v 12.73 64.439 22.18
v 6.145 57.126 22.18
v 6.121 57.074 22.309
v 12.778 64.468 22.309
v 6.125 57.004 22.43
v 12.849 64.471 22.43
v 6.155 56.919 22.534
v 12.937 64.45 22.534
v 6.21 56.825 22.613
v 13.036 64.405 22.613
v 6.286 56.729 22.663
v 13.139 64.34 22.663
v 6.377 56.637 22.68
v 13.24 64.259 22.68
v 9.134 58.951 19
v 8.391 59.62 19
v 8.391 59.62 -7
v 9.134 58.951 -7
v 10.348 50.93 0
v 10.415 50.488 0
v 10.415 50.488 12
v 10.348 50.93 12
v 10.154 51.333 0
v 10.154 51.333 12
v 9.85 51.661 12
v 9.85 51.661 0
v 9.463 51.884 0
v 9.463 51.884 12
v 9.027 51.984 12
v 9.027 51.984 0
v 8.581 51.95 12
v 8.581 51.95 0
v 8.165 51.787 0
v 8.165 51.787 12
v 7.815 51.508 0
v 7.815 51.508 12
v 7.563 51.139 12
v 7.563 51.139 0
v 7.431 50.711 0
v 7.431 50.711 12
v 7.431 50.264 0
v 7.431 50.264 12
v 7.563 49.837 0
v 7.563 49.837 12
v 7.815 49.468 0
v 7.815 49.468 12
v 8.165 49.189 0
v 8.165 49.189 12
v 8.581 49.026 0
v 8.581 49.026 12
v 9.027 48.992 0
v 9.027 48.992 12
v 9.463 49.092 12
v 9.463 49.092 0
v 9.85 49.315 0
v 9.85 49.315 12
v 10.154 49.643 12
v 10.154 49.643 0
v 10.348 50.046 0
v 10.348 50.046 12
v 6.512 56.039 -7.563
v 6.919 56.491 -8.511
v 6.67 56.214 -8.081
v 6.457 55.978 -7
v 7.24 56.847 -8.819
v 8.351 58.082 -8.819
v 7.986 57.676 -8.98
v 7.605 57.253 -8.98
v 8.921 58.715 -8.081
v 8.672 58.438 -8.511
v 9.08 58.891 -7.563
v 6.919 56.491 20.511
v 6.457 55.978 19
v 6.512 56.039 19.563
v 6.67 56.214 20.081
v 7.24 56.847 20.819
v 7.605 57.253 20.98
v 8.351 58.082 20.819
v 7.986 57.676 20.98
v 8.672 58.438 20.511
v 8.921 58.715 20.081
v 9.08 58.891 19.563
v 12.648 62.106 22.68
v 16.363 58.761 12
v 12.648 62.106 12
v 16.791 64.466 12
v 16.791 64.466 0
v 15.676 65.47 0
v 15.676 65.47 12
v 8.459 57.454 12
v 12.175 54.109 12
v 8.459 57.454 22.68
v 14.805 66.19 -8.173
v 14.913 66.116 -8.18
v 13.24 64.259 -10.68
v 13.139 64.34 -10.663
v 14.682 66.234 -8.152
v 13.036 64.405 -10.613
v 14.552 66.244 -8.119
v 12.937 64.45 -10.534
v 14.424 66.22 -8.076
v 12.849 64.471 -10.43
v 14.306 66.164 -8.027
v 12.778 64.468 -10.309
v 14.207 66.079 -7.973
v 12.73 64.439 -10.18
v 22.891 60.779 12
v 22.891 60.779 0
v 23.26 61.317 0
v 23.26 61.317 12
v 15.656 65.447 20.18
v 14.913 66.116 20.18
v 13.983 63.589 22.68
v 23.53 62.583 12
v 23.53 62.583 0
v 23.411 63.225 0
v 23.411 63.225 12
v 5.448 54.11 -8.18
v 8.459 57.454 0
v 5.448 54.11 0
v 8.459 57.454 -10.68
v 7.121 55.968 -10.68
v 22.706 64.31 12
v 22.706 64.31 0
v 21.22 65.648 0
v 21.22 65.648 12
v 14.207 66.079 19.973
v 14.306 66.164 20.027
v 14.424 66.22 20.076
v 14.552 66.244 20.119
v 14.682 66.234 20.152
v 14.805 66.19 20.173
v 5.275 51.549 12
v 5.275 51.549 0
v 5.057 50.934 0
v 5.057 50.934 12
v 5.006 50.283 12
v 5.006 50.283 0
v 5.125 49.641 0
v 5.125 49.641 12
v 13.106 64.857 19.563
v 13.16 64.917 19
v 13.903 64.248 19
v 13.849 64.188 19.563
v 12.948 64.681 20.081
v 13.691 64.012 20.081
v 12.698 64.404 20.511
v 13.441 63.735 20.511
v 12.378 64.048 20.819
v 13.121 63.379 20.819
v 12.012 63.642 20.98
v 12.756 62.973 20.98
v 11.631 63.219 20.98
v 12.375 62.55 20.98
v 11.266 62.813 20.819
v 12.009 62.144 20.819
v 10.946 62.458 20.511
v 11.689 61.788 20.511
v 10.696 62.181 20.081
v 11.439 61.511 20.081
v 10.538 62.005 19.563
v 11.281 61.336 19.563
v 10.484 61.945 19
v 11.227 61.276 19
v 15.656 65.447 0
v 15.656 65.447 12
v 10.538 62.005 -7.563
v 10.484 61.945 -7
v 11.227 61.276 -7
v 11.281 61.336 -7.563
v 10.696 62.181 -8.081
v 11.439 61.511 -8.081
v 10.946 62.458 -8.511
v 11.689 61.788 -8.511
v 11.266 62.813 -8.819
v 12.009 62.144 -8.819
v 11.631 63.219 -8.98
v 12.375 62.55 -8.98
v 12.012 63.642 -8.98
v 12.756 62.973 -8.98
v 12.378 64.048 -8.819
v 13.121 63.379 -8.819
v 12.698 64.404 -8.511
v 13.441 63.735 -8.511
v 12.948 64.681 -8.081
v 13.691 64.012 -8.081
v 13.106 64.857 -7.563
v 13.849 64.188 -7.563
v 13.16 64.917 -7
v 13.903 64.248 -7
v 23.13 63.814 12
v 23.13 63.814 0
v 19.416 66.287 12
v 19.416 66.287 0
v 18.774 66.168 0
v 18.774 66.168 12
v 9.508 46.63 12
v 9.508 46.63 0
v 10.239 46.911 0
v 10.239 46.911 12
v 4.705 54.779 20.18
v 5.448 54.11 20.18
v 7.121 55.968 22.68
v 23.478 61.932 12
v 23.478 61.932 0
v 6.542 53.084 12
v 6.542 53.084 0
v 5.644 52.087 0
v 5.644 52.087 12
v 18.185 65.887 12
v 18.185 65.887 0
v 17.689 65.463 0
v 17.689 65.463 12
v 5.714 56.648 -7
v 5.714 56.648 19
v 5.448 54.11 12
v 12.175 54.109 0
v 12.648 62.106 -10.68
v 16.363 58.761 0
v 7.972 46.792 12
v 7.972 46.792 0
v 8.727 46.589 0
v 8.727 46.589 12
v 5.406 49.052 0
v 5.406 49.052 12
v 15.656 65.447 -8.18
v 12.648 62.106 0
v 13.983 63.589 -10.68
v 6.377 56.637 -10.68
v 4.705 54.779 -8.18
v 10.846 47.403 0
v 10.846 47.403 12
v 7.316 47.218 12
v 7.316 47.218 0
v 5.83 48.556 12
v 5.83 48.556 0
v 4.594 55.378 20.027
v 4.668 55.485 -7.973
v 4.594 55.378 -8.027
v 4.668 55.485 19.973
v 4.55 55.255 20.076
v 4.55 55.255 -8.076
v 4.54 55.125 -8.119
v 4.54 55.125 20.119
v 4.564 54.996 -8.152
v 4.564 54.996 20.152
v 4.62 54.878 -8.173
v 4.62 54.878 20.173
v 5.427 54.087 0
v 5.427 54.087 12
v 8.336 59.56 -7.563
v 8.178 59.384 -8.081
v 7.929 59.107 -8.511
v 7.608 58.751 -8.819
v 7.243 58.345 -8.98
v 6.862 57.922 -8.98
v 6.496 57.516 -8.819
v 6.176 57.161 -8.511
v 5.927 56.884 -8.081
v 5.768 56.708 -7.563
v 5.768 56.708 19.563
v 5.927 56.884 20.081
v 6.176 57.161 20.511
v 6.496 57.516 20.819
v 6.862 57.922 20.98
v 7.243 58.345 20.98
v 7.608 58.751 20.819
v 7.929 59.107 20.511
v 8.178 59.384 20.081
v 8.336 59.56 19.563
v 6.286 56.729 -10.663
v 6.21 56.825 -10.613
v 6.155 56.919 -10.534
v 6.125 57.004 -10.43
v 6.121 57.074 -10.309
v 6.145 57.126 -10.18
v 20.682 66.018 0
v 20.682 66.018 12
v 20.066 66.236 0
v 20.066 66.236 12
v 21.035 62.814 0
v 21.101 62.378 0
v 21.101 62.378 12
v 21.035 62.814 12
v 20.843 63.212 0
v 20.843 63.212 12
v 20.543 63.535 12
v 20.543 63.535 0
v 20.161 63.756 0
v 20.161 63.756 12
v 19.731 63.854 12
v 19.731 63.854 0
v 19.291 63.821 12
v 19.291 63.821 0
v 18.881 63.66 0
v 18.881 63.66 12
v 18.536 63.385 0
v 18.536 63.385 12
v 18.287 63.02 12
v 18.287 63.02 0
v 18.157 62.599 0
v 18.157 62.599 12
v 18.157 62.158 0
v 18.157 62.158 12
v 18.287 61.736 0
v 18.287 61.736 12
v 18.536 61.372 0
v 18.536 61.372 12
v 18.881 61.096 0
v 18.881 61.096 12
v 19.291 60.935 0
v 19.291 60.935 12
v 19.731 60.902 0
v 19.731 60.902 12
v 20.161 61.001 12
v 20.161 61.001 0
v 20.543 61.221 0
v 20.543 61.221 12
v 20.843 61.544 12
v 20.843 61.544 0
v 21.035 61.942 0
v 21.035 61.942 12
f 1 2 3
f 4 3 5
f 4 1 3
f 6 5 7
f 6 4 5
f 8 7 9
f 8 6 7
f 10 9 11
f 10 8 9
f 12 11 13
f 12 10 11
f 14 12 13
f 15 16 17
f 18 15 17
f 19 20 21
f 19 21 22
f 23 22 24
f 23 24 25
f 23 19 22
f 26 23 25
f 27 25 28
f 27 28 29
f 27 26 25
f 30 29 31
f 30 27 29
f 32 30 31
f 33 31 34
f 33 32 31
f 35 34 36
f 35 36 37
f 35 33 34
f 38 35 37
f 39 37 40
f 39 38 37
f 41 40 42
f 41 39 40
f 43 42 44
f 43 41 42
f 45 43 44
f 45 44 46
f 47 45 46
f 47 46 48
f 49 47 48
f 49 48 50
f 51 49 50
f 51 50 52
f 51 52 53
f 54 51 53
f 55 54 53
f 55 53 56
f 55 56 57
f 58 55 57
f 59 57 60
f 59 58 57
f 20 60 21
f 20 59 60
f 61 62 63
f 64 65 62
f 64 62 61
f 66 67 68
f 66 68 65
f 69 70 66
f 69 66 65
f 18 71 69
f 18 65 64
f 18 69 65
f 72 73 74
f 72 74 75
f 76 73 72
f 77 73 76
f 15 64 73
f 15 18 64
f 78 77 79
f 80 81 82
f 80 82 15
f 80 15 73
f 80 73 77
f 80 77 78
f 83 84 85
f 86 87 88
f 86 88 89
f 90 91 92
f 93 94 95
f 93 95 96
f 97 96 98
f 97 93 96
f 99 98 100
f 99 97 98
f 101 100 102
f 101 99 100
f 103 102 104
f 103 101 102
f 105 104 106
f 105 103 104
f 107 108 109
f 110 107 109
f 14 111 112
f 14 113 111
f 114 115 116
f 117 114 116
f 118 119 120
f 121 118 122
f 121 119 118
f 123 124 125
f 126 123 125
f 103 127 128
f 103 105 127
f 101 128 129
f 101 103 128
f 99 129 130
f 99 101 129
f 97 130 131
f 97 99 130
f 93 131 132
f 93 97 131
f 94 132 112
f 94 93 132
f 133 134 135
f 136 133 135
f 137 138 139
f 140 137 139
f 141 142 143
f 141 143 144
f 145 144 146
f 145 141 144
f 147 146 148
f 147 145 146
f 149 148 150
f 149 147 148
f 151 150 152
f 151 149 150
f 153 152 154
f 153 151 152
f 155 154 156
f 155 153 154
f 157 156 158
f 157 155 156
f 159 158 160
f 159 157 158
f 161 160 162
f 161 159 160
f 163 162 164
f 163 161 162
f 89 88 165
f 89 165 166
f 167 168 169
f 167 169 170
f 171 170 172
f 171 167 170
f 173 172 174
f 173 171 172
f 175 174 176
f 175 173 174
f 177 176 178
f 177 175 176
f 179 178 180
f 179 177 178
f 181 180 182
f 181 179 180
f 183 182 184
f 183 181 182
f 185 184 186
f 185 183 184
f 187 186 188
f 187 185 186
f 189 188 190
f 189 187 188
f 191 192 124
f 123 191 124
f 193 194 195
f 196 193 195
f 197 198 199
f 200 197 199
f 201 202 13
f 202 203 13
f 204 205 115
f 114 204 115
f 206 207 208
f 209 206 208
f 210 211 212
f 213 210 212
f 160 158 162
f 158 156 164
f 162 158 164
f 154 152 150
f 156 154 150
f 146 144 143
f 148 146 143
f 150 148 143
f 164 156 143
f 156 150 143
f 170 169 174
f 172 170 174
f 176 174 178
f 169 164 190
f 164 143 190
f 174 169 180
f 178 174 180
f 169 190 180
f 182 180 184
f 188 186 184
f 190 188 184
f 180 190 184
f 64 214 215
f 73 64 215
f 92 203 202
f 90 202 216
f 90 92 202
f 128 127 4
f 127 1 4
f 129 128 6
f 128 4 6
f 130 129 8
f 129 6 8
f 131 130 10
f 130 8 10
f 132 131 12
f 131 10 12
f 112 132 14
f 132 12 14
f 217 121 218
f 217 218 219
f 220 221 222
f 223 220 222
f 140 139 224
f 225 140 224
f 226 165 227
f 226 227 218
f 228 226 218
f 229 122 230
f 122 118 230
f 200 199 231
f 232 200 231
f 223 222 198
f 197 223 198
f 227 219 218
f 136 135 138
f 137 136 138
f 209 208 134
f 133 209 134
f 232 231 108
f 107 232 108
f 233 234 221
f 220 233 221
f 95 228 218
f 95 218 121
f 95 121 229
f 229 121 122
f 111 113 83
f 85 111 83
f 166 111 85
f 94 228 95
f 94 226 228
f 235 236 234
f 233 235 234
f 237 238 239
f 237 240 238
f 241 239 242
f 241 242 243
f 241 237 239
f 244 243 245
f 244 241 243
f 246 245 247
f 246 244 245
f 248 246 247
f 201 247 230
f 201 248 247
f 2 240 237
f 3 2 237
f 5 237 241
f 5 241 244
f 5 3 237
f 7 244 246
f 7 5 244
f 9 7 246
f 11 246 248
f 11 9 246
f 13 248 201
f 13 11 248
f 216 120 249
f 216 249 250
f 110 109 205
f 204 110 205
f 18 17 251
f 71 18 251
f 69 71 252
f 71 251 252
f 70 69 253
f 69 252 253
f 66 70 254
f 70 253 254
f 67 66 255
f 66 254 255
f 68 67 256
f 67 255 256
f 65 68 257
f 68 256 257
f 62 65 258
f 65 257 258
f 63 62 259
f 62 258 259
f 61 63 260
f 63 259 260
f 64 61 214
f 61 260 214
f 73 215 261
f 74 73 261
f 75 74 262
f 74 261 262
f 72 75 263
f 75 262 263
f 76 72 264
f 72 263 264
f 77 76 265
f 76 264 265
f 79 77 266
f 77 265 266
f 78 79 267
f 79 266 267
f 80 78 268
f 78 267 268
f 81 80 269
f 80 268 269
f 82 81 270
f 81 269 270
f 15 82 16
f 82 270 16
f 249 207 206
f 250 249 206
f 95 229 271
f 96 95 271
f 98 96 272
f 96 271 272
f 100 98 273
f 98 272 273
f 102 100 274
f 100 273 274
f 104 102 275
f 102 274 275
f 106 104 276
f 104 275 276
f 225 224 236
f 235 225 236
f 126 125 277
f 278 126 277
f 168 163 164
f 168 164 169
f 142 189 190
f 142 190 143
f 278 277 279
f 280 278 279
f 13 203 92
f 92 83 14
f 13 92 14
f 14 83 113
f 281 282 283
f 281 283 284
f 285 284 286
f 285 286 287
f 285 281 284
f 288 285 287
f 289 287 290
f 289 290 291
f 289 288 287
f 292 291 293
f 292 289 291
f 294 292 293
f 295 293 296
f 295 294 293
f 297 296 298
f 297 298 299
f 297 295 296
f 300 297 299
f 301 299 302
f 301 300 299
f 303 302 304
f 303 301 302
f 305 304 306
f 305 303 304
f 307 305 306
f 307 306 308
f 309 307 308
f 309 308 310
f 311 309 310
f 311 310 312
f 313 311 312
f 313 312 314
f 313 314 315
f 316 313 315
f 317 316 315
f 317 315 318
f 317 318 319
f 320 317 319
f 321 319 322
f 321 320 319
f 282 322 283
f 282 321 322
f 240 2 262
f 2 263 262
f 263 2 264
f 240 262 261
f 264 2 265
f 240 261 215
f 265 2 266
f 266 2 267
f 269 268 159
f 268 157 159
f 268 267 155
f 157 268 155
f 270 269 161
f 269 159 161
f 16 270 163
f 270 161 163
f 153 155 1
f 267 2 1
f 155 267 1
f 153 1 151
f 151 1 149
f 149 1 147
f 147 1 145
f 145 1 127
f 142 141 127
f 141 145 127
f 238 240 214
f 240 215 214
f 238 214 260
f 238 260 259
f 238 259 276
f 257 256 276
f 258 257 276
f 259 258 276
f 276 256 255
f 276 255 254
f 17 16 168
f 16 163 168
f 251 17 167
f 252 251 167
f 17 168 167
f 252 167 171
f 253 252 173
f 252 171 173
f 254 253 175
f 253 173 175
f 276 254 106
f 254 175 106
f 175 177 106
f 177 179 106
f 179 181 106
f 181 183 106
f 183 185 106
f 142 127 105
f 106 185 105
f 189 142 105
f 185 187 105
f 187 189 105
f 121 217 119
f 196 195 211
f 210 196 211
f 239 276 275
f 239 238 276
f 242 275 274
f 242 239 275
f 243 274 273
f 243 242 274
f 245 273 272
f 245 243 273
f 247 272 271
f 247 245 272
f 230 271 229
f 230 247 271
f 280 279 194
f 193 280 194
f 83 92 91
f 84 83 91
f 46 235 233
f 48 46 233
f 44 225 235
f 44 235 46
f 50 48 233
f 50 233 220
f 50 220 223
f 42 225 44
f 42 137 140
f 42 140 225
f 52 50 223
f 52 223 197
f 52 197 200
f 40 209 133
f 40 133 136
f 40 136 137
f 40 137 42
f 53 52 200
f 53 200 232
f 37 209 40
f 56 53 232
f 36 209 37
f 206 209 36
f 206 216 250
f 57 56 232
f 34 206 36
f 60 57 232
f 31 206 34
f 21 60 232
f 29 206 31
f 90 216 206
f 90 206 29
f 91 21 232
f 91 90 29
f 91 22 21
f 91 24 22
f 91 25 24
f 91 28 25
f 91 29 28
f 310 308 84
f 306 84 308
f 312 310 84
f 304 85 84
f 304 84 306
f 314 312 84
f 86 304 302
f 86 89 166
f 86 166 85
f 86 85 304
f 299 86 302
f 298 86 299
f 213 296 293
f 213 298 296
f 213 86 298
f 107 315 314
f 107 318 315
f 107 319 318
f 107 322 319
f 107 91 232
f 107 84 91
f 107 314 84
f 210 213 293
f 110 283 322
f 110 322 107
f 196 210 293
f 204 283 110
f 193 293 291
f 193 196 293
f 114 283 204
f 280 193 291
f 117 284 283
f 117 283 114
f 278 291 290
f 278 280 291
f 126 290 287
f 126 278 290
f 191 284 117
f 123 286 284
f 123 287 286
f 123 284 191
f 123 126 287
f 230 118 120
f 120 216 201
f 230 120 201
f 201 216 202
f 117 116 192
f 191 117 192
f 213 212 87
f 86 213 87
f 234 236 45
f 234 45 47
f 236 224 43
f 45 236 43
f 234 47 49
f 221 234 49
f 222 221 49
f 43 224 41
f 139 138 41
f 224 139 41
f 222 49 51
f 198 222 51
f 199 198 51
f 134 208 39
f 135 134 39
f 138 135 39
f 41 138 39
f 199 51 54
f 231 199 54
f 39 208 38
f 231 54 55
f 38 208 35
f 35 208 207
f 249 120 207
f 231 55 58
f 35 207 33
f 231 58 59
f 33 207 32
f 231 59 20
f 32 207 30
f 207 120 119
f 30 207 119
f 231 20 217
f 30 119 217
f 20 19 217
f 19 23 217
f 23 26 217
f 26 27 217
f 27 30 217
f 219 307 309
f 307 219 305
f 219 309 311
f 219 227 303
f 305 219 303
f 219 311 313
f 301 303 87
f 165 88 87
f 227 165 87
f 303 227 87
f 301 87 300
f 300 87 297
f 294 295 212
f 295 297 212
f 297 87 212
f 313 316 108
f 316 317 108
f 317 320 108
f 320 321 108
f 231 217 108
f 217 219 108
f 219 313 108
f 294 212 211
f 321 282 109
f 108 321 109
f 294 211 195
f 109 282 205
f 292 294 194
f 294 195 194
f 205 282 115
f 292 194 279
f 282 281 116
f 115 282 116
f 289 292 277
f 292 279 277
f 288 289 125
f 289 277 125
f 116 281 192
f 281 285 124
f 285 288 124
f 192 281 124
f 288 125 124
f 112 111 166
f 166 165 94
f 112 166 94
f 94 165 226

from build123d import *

# Parameters (mm, degrees)
MODEL_R             = 1.48
MODEL_R_2           = 1.5
BOSS_EXTRUDE1_DEPTH = 12
SKETCH3_W           = 12
SKETCH3_H           = 15.317128206
BOSS_EXTRUDE2_DEPTH = 1.5
BOSS_EXTRUDE3_DEPTH = 1.5
BOSS_EXTRUDE4_START = -4.5
BOSS_EXTRUDE4_DEPTH = 6.26
CHAMFER1_SIZE       = 2.5
FILLET2_R           = 0.5
CUT_EXTRUDE1_DEPTH  = 1


with BuildPart() as part:
    # Model → Boss-Extrude1 (new body)
    with BuildSketch(Plane.XY):
        Polygon((5.6444, 52.0867), (5.2748, 51.5489), (5.0569, 50.9337), (5.0057, 50.2831), (5.1246, 49.6414), (5.4056, 49.0523), (5.8295, 48.556), (7.3157, 47.2178), (7.9717, 46.7918), (8.7273, 46.5893), (9.5084, 46.6303), (10.2386, 46.9106), (10.8464, 47.4028), (22.8908, 60.7794), (23.2604, 61.3173), (23.4783, 61.9325), (23.5295, 62.5831), (23.4106, 63.2248), (23.1296, 63.8138), (22.7058, 64.3101), (21.2195, 65.6484), (20.6816, 66.018), (20.0664, 66.2359), (19.4158, 66.2871), (18.7741, 66.1681), (18.185, 65.8872), (17.6888, 65.4633), align=None)
        with Locations((19.6206, 62.3782)):
            Circle(MODEL_R, mode=Mode.SUBTRACT)
        with Locations((8.9146, 50.4879)):
            Circle(MODEL_R_2, mode=Mode.SUBTRACT)
    extrude(amount=BOSS_EXTRUDE1_DEPTH)

    # Sketch3 → Boss-Extrude2 (add)
    with BuildSketch(Plane(origin=(-22.783506803, 20.514455792, 0), x_dir=(0, 0, 1), z_dir=(-0.7431432988578212, 0.669132301837772, 0))):
        with Locations((6, 51.484746303)):
            Rectangle(SKETCH3_W, SKETCH3_H)
    extrude(amount=BOSS_EXTRUDE2_DEPTH)

    # Sketch4 → Boss-Extrude3 (add)
    with BuildSketch(Plane(origin=(-23.898221752, 21.518154244, 0), x_dir=(0, 0, 1), z_dir=(-0.7431432988578212, 0.669132301837772, 0))):
        Polygon((-10.680029898, 56.112643872), (-10.680029898, 59.112643872), (-7.680029898, 59.112643872), (19.680029898, 59.112643872), (22.680029898, 59.112643872), (22.680029898, 56.112643872), (22.680029898, 46.856848734), (22.680029898, 43.856848734), (19.680029898, 43.856848734), (-7.680029898, 43.856848734), (-10.680029898, 43.856848734), (-10.680029898, 46.856848734), align=None)
    extrude(amount=BOSS_EXTRUDE3_DEPTH)

    # Sketch9 → Boss-Extrude4 (add)
    with BuildSketch(Plane(origin=(29.346034145, 32.591923246, 0), x_dir=(0.7431432988578212, -0.669132301837772, 0), z_dir=(-0.669132301837772, -0.7431432988578212, 0)).offset(BOSS_EXTRUDE4_START)):
        Polygon((-32.15829543, 12), (-32.15829543, 22.680029898), (-27.158287979, 12), align=None)
    boss_extrude4 = extrude(amount=-BOSS_EXTRUDE4_DEPTH)

    # Mirror1: Boss-Extrude4 across plane
    add(boss_extrude4.mirror(Plane.XY.offset(6)))

    # Chamfer1
    chamfer1_edges = [part.edges().sort_by_distance(p)[0] for p in [
        (4.890454919, 54.611926717, 22.680029898),
        (4.890454919, 54.611926717, -10.680029898),
        (15.098600236, 65.949168642, -10.680029898),
        (15.098600236, 65.949168642, 22.680029898),
    ]]
    chamfer(chamfer1_edges, length=CHAMFER1_SIZE)

    # Fillet2
    fillet2_edges = [part.edges().sort_by_distance(p)[0] for p in [
        (4.333097445, 55.113775943, 6),
        (13.704827384, 65.522088744, 21.430029898),
        (9.437170103, 60.782396906, 22.680029898),
        (5.169512823, 56.042705067, 21.430029898),
        (13.704827384, 65.522088744, -9.430029898),
        (5.169512823, 56.042705067, -9.430029898),
        (9.437170103, 60.782396906, -10.680029898),
        (14.541242762, 66.451017868, 6),
    ]]
    fillet(fillet2_edges, radius=FILLET2_R)

    # Sketch10 → Cut-Extrude1 (cut)
    with BuildSketch(Plane(origin=(-25.0129367, 22.521852697, 0), x_dir=(0, 0, 1), z_dir=(-0.7431432988578214, 0.6691323018377716, 0))):
        with BuildLine():
            Line((19, 53.048695087), (-7, 53.048695087))
            ThreePointArc((-7, 53.048695087), (-9, 55.048695087), (-7, 57.048695087))
            Line((-7, 57.048695087), (19, 57.048695087))
            ThreePointArc((19, 57.048695087), (21, 55.048695087), (19, 53.048695087))
        make_face()
        with BuildLine():
            Line((19, 49.920797519), (-7, 49.920797519))
            ThreePointArc((-7, 49.920797519), (-9, 47.920797519), (-7, 45.920797519))
            Line((-7, 45.920797519), (19, 45.920797519))
            ThreePointArc((19, 45.920797519), (21, 47.920797519), (19, 49.920797519))
        make_face()
    extrude(amount=-CUT_EXTRUDE1_DEPTH, mode=Mode.SUBTRACT)


solid = part.part
